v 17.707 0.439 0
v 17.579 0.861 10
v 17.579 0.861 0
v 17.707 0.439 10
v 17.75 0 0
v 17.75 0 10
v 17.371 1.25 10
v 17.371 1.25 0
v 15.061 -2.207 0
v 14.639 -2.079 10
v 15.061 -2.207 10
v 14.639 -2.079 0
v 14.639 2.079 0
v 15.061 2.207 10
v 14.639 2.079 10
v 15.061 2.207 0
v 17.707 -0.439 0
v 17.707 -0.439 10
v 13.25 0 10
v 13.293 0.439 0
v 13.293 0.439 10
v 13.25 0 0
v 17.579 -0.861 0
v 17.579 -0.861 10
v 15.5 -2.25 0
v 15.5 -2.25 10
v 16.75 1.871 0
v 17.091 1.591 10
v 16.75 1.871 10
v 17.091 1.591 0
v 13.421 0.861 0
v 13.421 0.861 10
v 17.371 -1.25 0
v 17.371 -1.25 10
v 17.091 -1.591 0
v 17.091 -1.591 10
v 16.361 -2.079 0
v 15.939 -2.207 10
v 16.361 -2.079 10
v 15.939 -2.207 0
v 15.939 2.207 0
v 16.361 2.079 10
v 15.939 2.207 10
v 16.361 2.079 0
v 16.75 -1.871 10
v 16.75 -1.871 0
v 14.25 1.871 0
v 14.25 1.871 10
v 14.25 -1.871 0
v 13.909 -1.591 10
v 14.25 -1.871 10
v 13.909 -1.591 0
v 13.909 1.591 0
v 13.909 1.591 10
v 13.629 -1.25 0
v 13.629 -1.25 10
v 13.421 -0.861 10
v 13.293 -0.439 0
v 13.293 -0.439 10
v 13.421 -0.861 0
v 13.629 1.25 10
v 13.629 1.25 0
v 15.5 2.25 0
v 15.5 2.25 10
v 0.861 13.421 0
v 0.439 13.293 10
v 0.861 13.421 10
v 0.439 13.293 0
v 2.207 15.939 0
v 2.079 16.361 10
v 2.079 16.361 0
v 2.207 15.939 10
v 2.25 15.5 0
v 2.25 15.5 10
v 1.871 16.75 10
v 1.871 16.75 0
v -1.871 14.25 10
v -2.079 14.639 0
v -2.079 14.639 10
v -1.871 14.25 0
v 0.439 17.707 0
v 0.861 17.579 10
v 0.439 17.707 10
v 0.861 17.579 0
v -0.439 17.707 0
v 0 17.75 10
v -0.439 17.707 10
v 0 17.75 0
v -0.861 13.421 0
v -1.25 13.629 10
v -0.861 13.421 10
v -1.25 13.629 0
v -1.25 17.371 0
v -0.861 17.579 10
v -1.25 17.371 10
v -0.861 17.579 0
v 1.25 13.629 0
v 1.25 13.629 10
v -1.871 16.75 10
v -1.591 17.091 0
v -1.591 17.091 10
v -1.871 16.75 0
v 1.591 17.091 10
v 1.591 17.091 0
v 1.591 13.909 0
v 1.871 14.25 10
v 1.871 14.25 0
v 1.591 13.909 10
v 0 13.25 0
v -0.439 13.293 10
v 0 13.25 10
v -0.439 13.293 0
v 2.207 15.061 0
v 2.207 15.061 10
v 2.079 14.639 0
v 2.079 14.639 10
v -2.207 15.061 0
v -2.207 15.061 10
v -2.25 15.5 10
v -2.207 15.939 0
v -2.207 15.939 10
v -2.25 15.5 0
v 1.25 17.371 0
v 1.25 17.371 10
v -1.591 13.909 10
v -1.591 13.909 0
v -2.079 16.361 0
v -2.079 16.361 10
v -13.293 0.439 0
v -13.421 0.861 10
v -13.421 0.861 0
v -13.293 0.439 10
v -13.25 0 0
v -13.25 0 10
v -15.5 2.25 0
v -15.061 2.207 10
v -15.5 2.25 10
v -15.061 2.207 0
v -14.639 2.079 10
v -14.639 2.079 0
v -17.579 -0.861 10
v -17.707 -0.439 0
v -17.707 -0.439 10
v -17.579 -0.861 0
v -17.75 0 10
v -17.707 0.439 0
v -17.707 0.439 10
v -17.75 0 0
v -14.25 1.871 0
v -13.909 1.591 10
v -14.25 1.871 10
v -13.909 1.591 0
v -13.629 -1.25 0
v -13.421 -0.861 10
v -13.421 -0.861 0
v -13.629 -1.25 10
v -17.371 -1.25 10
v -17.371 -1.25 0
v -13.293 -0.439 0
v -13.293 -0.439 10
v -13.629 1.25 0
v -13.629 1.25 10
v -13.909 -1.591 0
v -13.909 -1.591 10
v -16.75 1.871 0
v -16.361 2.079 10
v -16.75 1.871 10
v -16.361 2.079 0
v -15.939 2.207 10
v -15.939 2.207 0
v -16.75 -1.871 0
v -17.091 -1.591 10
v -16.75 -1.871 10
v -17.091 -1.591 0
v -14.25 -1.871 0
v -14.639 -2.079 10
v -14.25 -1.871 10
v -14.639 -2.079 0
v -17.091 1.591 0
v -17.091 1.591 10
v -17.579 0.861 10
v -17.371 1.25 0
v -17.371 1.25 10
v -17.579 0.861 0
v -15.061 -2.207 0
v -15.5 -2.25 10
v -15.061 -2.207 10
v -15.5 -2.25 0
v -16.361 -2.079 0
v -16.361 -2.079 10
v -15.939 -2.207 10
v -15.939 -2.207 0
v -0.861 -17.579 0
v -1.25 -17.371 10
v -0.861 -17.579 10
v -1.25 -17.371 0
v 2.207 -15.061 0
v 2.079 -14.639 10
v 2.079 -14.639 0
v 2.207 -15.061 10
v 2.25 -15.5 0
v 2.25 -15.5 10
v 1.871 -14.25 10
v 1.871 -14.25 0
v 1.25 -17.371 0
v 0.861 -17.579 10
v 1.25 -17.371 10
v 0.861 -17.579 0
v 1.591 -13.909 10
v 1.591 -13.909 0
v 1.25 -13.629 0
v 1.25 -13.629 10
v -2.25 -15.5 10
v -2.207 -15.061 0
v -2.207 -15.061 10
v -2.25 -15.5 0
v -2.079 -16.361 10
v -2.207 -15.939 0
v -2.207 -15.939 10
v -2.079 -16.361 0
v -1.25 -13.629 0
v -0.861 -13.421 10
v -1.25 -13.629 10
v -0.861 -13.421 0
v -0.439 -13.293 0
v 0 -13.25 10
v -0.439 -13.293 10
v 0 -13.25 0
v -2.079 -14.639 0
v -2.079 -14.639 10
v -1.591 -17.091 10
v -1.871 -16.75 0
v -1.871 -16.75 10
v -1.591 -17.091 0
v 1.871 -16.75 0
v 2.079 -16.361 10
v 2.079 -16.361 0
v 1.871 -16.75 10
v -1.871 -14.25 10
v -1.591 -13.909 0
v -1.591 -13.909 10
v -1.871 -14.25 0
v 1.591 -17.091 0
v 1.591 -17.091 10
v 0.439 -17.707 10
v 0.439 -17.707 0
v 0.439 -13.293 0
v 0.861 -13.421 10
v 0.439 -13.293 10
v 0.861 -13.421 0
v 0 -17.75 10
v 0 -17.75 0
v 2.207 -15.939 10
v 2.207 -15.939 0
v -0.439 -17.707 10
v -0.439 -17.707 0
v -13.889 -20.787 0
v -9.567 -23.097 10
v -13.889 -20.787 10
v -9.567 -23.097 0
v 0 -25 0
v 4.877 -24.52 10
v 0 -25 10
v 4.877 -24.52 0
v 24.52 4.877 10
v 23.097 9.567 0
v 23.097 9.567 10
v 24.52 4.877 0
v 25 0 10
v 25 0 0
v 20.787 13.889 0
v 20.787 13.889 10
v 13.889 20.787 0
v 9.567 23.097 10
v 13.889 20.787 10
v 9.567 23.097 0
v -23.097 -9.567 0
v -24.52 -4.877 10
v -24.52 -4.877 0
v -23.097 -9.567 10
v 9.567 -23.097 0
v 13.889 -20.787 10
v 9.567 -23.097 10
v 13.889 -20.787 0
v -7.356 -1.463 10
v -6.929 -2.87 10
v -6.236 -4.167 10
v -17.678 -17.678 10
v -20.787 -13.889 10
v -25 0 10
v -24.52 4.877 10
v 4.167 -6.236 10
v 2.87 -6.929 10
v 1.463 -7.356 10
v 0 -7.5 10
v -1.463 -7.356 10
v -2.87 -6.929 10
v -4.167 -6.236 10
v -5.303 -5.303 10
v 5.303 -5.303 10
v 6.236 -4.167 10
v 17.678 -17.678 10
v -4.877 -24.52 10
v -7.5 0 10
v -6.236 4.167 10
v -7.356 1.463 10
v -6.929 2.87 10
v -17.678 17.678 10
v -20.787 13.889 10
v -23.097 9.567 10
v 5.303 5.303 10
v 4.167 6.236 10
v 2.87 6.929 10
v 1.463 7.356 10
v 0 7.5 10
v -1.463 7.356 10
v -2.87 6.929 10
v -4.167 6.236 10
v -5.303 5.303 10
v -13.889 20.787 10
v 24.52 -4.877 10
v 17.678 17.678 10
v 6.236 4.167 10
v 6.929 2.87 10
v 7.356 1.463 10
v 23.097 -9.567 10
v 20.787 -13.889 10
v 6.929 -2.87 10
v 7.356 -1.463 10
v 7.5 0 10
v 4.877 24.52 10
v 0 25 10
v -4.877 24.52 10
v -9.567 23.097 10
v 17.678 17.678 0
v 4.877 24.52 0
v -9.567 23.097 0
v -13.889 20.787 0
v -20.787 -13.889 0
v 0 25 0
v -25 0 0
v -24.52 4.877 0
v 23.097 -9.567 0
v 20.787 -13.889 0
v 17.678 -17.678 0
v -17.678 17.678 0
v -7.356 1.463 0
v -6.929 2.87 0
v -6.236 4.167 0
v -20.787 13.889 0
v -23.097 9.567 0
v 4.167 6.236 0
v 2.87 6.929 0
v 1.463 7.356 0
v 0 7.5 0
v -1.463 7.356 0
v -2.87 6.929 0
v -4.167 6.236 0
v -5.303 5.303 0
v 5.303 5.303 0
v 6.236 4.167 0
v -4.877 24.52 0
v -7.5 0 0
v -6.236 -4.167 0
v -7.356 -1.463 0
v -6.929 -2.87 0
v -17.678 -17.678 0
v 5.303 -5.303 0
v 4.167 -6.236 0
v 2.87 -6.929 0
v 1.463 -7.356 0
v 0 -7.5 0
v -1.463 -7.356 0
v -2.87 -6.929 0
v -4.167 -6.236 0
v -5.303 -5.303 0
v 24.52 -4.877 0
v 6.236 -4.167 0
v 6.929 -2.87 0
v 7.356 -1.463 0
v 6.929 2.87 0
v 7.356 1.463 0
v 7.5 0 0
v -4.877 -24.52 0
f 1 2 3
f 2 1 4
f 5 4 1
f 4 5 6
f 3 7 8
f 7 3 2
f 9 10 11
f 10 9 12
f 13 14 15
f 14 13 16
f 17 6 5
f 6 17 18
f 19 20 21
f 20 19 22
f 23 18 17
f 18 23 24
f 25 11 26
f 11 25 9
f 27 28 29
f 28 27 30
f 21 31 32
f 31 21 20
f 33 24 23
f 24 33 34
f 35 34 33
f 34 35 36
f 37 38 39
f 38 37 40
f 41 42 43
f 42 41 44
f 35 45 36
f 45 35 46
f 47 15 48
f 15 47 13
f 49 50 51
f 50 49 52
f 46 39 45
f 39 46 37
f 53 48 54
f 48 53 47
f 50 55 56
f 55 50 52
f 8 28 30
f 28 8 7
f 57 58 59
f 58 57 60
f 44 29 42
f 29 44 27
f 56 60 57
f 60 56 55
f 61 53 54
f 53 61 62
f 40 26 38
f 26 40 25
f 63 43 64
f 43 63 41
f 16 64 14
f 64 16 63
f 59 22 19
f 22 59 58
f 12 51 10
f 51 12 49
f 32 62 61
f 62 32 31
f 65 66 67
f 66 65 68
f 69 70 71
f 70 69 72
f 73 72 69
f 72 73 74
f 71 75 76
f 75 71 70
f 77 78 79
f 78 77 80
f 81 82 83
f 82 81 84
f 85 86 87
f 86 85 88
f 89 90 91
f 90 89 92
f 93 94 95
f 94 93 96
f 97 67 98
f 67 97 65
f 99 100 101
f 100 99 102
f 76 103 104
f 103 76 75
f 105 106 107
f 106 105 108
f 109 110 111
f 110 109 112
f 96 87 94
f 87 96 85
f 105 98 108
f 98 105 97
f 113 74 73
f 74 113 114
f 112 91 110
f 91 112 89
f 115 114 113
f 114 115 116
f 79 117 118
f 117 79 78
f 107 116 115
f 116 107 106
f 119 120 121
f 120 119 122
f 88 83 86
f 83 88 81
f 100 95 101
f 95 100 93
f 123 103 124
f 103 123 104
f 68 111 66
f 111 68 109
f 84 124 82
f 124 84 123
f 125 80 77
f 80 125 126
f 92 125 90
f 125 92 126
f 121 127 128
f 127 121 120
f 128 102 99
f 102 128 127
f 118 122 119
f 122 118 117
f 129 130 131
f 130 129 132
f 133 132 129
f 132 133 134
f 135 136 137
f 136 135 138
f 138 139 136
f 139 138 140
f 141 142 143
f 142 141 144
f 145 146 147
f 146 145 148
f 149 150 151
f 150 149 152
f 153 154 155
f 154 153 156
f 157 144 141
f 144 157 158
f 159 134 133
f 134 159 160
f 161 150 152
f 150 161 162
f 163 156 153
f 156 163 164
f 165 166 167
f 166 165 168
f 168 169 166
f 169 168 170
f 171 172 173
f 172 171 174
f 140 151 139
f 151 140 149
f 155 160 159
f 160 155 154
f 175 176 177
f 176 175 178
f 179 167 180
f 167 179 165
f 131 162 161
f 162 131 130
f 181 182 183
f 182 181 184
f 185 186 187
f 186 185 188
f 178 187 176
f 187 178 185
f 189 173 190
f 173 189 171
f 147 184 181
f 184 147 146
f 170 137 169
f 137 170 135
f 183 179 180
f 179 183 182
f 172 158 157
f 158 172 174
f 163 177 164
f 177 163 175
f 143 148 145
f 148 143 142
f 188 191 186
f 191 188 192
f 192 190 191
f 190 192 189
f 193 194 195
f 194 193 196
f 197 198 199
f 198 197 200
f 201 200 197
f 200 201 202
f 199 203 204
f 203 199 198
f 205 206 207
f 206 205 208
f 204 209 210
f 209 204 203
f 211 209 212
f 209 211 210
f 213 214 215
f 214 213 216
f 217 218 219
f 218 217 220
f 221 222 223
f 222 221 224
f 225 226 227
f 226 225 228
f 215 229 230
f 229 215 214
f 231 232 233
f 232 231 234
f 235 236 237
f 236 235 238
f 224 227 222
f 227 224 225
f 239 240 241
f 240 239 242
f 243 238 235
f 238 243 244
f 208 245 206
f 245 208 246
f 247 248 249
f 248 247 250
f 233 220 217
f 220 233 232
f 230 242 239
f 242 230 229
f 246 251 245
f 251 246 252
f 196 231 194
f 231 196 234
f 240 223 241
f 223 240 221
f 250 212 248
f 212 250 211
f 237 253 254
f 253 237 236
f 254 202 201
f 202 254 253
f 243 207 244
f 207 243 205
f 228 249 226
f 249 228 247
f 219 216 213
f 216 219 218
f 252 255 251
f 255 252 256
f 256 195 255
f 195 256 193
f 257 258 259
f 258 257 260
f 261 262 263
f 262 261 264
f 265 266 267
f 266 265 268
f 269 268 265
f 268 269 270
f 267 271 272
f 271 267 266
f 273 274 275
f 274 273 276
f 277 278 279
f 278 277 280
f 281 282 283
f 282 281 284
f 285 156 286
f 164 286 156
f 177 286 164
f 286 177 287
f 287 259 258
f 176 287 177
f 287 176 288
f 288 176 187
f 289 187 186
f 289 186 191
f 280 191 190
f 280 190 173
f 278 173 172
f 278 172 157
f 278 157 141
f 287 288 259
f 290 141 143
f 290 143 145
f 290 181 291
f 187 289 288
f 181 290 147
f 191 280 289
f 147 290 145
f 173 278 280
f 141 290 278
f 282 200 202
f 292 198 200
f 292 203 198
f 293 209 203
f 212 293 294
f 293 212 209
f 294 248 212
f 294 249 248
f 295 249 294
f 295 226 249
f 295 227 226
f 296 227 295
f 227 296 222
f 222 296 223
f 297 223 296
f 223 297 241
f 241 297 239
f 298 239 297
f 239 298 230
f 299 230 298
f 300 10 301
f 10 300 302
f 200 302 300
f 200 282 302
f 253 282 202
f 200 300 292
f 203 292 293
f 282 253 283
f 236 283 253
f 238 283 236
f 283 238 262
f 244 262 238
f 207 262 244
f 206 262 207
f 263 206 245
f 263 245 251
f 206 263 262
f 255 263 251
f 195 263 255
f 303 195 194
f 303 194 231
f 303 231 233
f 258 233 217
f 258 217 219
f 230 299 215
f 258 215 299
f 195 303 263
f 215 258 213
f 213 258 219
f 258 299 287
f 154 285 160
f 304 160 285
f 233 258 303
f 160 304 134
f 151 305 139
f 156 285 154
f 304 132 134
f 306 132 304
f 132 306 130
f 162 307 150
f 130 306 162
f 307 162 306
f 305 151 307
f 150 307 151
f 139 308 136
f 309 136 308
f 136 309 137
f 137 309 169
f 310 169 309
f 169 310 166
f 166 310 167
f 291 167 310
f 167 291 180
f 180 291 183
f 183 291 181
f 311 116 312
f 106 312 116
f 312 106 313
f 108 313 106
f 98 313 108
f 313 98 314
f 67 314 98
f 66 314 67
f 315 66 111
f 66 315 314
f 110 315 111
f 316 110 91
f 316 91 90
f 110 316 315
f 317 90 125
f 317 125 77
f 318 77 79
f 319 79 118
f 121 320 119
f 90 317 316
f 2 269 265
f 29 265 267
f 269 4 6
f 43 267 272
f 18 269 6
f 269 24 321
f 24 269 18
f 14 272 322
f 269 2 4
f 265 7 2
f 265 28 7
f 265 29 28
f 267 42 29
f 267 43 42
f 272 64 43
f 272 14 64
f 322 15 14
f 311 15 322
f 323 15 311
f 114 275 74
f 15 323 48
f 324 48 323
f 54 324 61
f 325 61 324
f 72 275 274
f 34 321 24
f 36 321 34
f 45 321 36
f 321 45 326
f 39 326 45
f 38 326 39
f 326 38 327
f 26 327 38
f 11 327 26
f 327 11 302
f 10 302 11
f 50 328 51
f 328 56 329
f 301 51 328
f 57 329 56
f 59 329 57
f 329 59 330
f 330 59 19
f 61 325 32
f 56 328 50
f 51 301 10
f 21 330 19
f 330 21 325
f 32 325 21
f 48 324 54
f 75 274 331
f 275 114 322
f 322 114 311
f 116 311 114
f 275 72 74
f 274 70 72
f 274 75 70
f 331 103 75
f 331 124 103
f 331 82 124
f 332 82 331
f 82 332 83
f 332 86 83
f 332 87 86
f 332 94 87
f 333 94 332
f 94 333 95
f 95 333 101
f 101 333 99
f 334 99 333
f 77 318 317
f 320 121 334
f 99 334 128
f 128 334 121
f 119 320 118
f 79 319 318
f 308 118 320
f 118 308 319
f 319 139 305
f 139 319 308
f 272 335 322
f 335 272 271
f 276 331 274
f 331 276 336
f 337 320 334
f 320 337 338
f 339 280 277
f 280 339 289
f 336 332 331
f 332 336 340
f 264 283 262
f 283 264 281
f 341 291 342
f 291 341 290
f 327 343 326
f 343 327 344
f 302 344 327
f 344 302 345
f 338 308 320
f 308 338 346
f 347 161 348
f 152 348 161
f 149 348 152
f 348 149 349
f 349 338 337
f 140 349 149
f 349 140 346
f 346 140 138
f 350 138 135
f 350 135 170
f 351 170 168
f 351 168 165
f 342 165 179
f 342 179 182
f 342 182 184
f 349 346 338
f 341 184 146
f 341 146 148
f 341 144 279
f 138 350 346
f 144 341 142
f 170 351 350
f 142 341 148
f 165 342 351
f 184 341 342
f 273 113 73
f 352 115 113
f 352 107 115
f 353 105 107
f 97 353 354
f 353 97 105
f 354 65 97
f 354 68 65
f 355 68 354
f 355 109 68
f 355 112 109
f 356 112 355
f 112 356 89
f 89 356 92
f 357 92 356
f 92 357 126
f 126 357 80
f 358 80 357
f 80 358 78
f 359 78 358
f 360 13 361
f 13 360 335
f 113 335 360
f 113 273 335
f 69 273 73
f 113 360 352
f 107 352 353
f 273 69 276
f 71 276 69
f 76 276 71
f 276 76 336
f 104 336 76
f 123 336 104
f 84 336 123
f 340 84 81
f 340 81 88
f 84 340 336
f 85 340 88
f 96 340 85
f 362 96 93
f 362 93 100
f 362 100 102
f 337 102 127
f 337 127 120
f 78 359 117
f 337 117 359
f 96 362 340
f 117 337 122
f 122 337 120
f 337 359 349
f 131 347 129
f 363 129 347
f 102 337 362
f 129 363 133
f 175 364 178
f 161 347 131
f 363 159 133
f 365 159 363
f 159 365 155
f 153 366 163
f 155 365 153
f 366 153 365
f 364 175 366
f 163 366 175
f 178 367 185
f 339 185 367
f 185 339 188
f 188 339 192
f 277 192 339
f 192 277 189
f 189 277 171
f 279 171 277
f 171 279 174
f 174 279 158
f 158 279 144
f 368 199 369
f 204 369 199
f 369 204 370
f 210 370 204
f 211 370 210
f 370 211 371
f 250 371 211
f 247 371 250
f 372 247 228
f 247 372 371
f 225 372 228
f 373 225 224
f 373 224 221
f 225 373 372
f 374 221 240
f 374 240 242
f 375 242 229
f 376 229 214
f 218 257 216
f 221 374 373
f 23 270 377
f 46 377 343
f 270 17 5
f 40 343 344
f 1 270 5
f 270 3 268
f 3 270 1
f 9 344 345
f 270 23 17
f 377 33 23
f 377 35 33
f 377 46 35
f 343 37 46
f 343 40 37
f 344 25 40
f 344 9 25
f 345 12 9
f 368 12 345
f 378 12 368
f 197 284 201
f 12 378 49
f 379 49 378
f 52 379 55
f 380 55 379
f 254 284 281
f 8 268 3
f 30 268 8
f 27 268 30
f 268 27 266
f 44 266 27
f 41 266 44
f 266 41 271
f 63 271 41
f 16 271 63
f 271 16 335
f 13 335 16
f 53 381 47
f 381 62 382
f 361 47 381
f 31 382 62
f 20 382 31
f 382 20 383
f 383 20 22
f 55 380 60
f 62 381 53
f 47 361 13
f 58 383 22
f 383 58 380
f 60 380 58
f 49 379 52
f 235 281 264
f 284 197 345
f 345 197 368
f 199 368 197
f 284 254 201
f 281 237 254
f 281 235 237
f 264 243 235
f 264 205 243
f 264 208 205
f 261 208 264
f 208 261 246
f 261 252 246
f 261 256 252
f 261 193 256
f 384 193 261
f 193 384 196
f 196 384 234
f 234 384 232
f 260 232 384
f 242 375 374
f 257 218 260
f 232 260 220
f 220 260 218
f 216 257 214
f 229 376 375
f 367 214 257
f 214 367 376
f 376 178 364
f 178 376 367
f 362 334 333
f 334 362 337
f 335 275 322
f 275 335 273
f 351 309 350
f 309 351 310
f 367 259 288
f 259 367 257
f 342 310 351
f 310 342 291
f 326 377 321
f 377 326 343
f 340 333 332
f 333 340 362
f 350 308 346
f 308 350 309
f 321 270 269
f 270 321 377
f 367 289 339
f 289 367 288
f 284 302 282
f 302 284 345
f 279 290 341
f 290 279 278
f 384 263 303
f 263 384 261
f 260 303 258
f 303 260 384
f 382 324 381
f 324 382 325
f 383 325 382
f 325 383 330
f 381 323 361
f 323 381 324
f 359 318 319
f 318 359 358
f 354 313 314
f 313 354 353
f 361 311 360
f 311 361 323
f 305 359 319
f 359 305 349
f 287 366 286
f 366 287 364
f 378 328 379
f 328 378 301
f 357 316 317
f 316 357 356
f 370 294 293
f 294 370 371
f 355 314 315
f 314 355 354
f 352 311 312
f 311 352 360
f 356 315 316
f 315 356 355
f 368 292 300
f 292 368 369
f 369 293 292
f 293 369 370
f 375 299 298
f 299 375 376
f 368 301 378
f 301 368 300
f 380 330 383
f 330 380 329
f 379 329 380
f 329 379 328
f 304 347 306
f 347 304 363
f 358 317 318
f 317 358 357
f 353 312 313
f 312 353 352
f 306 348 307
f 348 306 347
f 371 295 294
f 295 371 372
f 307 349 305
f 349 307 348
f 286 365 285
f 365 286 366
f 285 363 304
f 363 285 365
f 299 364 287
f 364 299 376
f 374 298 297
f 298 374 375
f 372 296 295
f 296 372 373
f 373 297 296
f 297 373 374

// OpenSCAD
$fn = 32;

// ----------------------------------------------------------------------
// Flange Ø50 x 10
// 4 holes on a Ø31 bolt circle, bolted joints
// ----------------------------------------------------------------------

// --- parameters (mm) ---
flange_d = 50;   // outside diameter of the flange
thickness = 10;  // flange thickness
holes = 4;       // number of bolt holes
pcd = 31;        // bolt circle diameter
start_deg = 0;   // angle of the first hole, from +X
hole_d = 4.5;    // bolt hole diameter
bore_d = 15;     // central through bore
hub_d = 23;      // hub outside diameter
hub_h = 0;       // hub height above the flange face (0 = no hub)

// --- derived feature positions (mm) ---
height = thickness + hub_h;  // = 10   overall height of the part
pcd_r = pcd / 2;             // = 15.5   bolt circle radius
hole_step = 360 / holes;     // = 90   angular pitch
feature_centers = [
  [pcd_r * cos(start_deg + 0 * hole_step), pcd_r * sin(start_deg + 0 * hole_step)],
  [pcd_r * cos(start_deg + 1 * hole_step), pcd_r * sin(start_deg + 1 * hole_step)],
  [pcd_r * cos(start_deg + 2 * hole_step), pcd_r * sin(start_deg + 2 * hole_step)],
  [pcd_r * cos(start_deg + 3 * hole_step), pcd_r * sin(start_deg + 3 * hole_step)]
];   // bolt hole centres on the pitch circle

// flange disc, every hole and the bore cut straight through
difference() {
  union() {
    cylinder(d = flange_d, h = thickness);
  }
  translate([0, 0, -1]) cylinder(d = bore_d, h = height + 2);  // bore, through
  for (centre = feature_centers)
    translate([centre[0], centre[1], -1]) cylinder(d = hole_d, h = thickness + 2);
}
